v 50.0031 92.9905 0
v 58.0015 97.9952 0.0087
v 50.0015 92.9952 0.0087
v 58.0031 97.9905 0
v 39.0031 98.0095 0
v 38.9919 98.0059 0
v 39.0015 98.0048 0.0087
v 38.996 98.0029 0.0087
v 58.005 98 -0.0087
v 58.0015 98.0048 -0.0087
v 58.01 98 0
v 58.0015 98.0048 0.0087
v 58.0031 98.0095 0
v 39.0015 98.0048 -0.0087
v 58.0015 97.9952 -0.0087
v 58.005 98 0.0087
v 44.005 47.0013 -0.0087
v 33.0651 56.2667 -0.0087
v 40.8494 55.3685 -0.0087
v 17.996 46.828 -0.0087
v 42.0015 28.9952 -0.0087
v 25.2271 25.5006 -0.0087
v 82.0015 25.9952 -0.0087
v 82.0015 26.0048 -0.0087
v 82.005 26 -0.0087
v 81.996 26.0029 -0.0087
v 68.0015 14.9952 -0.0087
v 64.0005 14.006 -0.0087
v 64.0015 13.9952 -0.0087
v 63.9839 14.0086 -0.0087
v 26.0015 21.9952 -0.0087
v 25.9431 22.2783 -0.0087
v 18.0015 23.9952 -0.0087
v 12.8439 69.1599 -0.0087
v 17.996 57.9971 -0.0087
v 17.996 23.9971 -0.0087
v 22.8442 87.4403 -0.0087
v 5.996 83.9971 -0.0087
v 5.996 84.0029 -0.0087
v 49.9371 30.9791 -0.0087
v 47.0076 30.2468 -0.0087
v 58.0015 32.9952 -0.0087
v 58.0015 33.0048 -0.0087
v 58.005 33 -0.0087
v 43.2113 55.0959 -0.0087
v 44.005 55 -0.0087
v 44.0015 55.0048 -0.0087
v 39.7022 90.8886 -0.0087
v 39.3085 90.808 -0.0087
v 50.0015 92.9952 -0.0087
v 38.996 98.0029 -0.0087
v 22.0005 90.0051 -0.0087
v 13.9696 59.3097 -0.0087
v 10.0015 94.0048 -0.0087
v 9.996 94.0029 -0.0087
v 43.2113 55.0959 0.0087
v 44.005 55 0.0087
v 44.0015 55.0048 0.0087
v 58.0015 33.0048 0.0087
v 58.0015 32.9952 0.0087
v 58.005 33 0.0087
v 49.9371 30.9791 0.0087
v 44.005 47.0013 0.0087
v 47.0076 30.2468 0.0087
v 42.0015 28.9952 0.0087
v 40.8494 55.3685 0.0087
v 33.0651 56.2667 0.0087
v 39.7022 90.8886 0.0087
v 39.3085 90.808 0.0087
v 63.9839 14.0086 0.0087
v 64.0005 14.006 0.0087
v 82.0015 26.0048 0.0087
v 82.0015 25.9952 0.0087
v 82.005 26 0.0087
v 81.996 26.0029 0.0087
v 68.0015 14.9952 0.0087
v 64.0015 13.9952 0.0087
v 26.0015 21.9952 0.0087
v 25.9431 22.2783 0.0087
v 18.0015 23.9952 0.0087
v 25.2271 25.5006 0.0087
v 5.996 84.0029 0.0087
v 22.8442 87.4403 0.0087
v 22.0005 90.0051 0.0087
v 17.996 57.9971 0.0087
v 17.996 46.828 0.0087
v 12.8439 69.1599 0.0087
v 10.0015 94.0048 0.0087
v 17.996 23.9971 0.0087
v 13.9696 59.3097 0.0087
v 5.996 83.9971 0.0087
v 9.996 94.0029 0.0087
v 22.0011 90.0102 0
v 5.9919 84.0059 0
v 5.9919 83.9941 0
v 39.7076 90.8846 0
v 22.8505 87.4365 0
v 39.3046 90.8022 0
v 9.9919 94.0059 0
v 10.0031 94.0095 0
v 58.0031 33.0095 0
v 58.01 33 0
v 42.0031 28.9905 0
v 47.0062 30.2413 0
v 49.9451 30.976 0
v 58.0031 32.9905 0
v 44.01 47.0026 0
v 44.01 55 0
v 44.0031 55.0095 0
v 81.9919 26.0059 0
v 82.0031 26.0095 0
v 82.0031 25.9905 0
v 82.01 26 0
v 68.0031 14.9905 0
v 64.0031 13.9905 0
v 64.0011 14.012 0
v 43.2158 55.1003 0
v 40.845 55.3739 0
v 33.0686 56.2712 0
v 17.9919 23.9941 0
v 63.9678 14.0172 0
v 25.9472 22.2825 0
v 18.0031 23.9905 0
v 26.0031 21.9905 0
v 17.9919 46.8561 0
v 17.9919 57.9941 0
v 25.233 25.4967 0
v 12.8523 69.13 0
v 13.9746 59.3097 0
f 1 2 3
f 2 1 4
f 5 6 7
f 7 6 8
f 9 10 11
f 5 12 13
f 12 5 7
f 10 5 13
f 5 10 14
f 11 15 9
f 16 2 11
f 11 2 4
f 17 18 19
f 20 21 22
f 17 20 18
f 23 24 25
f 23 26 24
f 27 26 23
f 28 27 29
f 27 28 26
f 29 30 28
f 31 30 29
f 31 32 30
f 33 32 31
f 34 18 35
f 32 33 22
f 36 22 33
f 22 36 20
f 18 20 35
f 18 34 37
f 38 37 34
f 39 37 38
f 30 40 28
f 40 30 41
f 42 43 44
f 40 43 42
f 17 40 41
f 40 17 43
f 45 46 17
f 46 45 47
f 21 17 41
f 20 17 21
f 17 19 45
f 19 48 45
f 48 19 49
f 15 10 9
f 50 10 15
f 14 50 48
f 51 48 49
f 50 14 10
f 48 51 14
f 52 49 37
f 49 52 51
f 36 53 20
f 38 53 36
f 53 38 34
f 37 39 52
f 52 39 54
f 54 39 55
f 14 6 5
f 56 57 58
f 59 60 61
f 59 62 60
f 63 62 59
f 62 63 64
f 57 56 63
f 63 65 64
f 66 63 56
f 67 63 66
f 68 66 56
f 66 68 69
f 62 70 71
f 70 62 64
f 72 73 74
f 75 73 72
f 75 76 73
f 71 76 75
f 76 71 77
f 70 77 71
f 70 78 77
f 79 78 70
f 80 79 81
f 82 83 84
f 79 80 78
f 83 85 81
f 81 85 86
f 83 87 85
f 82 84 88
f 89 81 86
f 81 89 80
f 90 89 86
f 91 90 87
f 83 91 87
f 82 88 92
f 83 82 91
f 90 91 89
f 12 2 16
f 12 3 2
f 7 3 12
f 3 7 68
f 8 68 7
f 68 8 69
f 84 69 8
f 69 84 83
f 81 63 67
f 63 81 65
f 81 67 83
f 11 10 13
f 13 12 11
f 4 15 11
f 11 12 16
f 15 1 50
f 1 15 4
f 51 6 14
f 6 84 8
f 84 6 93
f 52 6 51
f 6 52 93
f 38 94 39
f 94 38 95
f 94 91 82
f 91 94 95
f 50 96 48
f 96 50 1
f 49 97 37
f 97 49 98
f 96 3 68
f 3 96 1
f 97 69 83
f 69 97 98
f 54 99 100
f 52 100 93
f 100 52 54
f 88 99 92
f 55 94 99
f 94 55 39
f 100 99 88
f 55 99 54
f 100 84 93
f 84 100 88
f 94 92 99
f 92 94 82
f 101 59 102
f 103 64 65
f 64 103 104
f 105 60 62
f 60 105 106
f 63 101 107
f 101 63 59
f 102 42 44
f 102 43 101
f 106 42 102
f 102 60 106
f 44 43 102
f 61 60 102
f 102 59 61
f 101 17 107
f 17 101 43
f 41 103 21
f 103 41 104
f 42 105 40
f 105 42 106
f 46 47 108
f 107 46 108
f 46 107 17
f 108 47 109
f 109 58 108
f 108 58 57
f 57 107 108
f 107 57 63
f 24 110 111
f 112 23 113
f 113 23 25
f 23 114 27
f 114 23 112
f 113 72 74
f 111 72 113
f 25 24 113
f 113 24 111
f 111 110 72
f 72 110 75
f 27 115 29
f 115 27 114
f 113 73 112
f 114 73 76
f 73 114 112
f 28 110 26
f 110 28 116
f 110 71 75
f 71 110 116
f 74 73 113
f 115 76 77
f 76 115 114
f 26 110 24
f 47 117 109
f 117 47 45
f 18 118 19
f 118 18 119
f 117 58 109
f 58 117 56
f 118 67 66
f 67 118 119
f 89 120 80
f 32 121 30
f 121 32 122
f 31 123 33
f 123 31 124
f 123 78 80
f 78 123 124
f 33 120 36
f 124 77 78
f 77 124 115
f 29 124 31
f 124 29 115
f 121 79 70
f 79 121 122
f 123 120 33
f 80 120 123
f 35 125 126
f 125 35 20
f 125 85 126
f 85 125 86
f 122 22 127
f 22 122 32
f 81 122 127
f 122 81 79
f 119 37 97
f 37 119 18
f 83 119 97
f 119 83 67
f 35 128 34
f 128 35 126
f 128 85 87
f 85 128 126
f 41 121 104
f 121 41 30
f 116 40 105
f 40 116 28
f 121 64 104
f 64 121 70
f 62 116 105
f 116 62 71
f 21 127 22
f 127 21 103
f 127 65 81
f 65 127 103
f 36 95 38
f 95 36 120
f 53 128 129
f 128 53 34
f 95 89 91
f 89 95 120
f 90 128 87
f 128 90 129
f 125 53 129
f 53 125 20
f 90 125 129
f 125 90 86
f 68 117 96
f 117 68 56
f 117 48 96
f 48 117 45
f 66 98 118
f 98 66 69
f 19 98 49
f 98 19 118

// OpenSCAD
color([0.3519350680925015,0.6477014615427978,0.14125726454845833]) hull(){
    translate([50,93]) sphere(0.01);
    translate([58,98]) sphere(0.01);
    translate([39,98]) sphere(0.01);
}
color([0.23013900541024712,0.8285218163248013,0.9603761550286747]) hull(){
    translate([50,93]) sphere(0.01);
    translate([39,98]) sphere(0.01);
    translate([22,90]) sphere(0.01);
}
color([0.6050710034948523,0.017553655236826726,0.43262871278032167]) hull(){
    translate([22,90]) sphere(0.01);
    translate([50,93]) sphere(0.01);
    translate([6,84]) sphere(0.01);
}
color([0.2571490251669072,0.4480229944680496,0.14517873337393172]) hull(){
    translate([10,94]) sphere(0.01);
    translate([6,84]) sphere(0.01);
    translate([22,90]) sphere(0.01);
}
color([0.8405131005933094,0.9776834869331054,0.10300019528175153]) hull(){
    translate([58,33]) sphere(0.01);
    translate([42,29]) sphere(0.01);
    translate([44,47]) sphere(0.01);
}
color([0.998153073210626,0.8535026464000083,0.6855970549077809]) hull(){
    translate([44,55]) sphere(0.01);
    translate([44,47]) sphere(0.01);
    translate([42,29]) sphere(0.01);
}
color([0.7995005100691247,0.34047238184459006,0.1286635278612125]) hull(){
    translate([64,14]) sphere(0.01);
    translate([68,15]) sphere(0.01);
    translate([82,26]) sphere(0.01);
}
color([0.6020598448119898,0.9167847797194366,0.02081986636819022]) hull(){
    translate([44,55]) sphere(0.01);
    translate([42,29]) sphere(0.01);
    translate([18,58]) sphere(0.01);
}
color([0.9135118305629362,0.3823609034395232,0.42581309278619206]) hull(){
    translate([18,24]) sphere(0.01);
    translate([26,22]) sphere(0.01);
    translate([64,14]) sphere(0.01);
}
color([0.08967296065919184,0.0016857337534631478,0.31287848776698257]) hull(){
    translate([18,24]) sphere(0.01);
    translate([18,58]) sphere(0.01);
    translate([26,22]) sphere(0.01);
}
color([0.09731792302828757,0.364404074066101,0.8754307508322564]) hull(){
    translate([6,84]) sphere(0.01);
    translate([22,90]) sphere(0.01);
    translate([42,29]) sphere(0.01);
}
color([0.6967090939923642,0.5776053806129825,0.18685318159950626]) hull(){
    translate([6,84]) sphere(0.01);
    translate([42,29]) sphere(0.01);
    translate([18,58]) sphere(0.01);
}
color([0.9585806736472646,0.593334846568766,0.09927504601217696]) hull(){
    translate([6,84]) sphere(0.01);
    translate([18,58]) sphere(0.01);
    translate([64,14]) sphere(0.01);
}
color([0.19313665173925,0.6863688301261038,0.2093263356404984]) hull(){
    translate([22,90]) sphere(0.01);
    translate([18,58]) sphere(0.01);
    translate([42,29]) sphere(0.01);
}
color([0.2694340379225941,0.24598969558588324,0.16092298384524362]) hull(){
    translate([42,29]) sphere(0.01);
    translate([44,47]) sphere(0.01);
    translate([18,24]) sphere(0.01);
}
color([0.5102606956149307,0.431705445139412,0.38909399282504675]) hull(){
    translate([42,29]) sphere(0.01);
    translate([18,24]) sphere(0.01);
    translate([18,58]) sphere(0.01);
}
color([0.3194819673674283,0.6655357355223767,0.22692357675811492]) hull(){
    translate([10,94]) sphere(0.01);
    translate([6,84]) sphere(0.01);
    translate([18,24]) sphere(0.01);
}
color([0.9464906820257937,0.35776616524050997,0.9421064453260054]) hull(){
    translate([6,84]) sphere(0.01);
    translate([18,24]) sphere(0.01);
    translate([26,22]) sphere(0.01);
}
color([0.3792404853118415,0.27508202782836655,0.9368074710650367]) hull(){
    translate([42,29]) sphere(0.01);
    translate([44,47]) sphere(0.01);
    translate([39,98]) sphere(0.01);
}
